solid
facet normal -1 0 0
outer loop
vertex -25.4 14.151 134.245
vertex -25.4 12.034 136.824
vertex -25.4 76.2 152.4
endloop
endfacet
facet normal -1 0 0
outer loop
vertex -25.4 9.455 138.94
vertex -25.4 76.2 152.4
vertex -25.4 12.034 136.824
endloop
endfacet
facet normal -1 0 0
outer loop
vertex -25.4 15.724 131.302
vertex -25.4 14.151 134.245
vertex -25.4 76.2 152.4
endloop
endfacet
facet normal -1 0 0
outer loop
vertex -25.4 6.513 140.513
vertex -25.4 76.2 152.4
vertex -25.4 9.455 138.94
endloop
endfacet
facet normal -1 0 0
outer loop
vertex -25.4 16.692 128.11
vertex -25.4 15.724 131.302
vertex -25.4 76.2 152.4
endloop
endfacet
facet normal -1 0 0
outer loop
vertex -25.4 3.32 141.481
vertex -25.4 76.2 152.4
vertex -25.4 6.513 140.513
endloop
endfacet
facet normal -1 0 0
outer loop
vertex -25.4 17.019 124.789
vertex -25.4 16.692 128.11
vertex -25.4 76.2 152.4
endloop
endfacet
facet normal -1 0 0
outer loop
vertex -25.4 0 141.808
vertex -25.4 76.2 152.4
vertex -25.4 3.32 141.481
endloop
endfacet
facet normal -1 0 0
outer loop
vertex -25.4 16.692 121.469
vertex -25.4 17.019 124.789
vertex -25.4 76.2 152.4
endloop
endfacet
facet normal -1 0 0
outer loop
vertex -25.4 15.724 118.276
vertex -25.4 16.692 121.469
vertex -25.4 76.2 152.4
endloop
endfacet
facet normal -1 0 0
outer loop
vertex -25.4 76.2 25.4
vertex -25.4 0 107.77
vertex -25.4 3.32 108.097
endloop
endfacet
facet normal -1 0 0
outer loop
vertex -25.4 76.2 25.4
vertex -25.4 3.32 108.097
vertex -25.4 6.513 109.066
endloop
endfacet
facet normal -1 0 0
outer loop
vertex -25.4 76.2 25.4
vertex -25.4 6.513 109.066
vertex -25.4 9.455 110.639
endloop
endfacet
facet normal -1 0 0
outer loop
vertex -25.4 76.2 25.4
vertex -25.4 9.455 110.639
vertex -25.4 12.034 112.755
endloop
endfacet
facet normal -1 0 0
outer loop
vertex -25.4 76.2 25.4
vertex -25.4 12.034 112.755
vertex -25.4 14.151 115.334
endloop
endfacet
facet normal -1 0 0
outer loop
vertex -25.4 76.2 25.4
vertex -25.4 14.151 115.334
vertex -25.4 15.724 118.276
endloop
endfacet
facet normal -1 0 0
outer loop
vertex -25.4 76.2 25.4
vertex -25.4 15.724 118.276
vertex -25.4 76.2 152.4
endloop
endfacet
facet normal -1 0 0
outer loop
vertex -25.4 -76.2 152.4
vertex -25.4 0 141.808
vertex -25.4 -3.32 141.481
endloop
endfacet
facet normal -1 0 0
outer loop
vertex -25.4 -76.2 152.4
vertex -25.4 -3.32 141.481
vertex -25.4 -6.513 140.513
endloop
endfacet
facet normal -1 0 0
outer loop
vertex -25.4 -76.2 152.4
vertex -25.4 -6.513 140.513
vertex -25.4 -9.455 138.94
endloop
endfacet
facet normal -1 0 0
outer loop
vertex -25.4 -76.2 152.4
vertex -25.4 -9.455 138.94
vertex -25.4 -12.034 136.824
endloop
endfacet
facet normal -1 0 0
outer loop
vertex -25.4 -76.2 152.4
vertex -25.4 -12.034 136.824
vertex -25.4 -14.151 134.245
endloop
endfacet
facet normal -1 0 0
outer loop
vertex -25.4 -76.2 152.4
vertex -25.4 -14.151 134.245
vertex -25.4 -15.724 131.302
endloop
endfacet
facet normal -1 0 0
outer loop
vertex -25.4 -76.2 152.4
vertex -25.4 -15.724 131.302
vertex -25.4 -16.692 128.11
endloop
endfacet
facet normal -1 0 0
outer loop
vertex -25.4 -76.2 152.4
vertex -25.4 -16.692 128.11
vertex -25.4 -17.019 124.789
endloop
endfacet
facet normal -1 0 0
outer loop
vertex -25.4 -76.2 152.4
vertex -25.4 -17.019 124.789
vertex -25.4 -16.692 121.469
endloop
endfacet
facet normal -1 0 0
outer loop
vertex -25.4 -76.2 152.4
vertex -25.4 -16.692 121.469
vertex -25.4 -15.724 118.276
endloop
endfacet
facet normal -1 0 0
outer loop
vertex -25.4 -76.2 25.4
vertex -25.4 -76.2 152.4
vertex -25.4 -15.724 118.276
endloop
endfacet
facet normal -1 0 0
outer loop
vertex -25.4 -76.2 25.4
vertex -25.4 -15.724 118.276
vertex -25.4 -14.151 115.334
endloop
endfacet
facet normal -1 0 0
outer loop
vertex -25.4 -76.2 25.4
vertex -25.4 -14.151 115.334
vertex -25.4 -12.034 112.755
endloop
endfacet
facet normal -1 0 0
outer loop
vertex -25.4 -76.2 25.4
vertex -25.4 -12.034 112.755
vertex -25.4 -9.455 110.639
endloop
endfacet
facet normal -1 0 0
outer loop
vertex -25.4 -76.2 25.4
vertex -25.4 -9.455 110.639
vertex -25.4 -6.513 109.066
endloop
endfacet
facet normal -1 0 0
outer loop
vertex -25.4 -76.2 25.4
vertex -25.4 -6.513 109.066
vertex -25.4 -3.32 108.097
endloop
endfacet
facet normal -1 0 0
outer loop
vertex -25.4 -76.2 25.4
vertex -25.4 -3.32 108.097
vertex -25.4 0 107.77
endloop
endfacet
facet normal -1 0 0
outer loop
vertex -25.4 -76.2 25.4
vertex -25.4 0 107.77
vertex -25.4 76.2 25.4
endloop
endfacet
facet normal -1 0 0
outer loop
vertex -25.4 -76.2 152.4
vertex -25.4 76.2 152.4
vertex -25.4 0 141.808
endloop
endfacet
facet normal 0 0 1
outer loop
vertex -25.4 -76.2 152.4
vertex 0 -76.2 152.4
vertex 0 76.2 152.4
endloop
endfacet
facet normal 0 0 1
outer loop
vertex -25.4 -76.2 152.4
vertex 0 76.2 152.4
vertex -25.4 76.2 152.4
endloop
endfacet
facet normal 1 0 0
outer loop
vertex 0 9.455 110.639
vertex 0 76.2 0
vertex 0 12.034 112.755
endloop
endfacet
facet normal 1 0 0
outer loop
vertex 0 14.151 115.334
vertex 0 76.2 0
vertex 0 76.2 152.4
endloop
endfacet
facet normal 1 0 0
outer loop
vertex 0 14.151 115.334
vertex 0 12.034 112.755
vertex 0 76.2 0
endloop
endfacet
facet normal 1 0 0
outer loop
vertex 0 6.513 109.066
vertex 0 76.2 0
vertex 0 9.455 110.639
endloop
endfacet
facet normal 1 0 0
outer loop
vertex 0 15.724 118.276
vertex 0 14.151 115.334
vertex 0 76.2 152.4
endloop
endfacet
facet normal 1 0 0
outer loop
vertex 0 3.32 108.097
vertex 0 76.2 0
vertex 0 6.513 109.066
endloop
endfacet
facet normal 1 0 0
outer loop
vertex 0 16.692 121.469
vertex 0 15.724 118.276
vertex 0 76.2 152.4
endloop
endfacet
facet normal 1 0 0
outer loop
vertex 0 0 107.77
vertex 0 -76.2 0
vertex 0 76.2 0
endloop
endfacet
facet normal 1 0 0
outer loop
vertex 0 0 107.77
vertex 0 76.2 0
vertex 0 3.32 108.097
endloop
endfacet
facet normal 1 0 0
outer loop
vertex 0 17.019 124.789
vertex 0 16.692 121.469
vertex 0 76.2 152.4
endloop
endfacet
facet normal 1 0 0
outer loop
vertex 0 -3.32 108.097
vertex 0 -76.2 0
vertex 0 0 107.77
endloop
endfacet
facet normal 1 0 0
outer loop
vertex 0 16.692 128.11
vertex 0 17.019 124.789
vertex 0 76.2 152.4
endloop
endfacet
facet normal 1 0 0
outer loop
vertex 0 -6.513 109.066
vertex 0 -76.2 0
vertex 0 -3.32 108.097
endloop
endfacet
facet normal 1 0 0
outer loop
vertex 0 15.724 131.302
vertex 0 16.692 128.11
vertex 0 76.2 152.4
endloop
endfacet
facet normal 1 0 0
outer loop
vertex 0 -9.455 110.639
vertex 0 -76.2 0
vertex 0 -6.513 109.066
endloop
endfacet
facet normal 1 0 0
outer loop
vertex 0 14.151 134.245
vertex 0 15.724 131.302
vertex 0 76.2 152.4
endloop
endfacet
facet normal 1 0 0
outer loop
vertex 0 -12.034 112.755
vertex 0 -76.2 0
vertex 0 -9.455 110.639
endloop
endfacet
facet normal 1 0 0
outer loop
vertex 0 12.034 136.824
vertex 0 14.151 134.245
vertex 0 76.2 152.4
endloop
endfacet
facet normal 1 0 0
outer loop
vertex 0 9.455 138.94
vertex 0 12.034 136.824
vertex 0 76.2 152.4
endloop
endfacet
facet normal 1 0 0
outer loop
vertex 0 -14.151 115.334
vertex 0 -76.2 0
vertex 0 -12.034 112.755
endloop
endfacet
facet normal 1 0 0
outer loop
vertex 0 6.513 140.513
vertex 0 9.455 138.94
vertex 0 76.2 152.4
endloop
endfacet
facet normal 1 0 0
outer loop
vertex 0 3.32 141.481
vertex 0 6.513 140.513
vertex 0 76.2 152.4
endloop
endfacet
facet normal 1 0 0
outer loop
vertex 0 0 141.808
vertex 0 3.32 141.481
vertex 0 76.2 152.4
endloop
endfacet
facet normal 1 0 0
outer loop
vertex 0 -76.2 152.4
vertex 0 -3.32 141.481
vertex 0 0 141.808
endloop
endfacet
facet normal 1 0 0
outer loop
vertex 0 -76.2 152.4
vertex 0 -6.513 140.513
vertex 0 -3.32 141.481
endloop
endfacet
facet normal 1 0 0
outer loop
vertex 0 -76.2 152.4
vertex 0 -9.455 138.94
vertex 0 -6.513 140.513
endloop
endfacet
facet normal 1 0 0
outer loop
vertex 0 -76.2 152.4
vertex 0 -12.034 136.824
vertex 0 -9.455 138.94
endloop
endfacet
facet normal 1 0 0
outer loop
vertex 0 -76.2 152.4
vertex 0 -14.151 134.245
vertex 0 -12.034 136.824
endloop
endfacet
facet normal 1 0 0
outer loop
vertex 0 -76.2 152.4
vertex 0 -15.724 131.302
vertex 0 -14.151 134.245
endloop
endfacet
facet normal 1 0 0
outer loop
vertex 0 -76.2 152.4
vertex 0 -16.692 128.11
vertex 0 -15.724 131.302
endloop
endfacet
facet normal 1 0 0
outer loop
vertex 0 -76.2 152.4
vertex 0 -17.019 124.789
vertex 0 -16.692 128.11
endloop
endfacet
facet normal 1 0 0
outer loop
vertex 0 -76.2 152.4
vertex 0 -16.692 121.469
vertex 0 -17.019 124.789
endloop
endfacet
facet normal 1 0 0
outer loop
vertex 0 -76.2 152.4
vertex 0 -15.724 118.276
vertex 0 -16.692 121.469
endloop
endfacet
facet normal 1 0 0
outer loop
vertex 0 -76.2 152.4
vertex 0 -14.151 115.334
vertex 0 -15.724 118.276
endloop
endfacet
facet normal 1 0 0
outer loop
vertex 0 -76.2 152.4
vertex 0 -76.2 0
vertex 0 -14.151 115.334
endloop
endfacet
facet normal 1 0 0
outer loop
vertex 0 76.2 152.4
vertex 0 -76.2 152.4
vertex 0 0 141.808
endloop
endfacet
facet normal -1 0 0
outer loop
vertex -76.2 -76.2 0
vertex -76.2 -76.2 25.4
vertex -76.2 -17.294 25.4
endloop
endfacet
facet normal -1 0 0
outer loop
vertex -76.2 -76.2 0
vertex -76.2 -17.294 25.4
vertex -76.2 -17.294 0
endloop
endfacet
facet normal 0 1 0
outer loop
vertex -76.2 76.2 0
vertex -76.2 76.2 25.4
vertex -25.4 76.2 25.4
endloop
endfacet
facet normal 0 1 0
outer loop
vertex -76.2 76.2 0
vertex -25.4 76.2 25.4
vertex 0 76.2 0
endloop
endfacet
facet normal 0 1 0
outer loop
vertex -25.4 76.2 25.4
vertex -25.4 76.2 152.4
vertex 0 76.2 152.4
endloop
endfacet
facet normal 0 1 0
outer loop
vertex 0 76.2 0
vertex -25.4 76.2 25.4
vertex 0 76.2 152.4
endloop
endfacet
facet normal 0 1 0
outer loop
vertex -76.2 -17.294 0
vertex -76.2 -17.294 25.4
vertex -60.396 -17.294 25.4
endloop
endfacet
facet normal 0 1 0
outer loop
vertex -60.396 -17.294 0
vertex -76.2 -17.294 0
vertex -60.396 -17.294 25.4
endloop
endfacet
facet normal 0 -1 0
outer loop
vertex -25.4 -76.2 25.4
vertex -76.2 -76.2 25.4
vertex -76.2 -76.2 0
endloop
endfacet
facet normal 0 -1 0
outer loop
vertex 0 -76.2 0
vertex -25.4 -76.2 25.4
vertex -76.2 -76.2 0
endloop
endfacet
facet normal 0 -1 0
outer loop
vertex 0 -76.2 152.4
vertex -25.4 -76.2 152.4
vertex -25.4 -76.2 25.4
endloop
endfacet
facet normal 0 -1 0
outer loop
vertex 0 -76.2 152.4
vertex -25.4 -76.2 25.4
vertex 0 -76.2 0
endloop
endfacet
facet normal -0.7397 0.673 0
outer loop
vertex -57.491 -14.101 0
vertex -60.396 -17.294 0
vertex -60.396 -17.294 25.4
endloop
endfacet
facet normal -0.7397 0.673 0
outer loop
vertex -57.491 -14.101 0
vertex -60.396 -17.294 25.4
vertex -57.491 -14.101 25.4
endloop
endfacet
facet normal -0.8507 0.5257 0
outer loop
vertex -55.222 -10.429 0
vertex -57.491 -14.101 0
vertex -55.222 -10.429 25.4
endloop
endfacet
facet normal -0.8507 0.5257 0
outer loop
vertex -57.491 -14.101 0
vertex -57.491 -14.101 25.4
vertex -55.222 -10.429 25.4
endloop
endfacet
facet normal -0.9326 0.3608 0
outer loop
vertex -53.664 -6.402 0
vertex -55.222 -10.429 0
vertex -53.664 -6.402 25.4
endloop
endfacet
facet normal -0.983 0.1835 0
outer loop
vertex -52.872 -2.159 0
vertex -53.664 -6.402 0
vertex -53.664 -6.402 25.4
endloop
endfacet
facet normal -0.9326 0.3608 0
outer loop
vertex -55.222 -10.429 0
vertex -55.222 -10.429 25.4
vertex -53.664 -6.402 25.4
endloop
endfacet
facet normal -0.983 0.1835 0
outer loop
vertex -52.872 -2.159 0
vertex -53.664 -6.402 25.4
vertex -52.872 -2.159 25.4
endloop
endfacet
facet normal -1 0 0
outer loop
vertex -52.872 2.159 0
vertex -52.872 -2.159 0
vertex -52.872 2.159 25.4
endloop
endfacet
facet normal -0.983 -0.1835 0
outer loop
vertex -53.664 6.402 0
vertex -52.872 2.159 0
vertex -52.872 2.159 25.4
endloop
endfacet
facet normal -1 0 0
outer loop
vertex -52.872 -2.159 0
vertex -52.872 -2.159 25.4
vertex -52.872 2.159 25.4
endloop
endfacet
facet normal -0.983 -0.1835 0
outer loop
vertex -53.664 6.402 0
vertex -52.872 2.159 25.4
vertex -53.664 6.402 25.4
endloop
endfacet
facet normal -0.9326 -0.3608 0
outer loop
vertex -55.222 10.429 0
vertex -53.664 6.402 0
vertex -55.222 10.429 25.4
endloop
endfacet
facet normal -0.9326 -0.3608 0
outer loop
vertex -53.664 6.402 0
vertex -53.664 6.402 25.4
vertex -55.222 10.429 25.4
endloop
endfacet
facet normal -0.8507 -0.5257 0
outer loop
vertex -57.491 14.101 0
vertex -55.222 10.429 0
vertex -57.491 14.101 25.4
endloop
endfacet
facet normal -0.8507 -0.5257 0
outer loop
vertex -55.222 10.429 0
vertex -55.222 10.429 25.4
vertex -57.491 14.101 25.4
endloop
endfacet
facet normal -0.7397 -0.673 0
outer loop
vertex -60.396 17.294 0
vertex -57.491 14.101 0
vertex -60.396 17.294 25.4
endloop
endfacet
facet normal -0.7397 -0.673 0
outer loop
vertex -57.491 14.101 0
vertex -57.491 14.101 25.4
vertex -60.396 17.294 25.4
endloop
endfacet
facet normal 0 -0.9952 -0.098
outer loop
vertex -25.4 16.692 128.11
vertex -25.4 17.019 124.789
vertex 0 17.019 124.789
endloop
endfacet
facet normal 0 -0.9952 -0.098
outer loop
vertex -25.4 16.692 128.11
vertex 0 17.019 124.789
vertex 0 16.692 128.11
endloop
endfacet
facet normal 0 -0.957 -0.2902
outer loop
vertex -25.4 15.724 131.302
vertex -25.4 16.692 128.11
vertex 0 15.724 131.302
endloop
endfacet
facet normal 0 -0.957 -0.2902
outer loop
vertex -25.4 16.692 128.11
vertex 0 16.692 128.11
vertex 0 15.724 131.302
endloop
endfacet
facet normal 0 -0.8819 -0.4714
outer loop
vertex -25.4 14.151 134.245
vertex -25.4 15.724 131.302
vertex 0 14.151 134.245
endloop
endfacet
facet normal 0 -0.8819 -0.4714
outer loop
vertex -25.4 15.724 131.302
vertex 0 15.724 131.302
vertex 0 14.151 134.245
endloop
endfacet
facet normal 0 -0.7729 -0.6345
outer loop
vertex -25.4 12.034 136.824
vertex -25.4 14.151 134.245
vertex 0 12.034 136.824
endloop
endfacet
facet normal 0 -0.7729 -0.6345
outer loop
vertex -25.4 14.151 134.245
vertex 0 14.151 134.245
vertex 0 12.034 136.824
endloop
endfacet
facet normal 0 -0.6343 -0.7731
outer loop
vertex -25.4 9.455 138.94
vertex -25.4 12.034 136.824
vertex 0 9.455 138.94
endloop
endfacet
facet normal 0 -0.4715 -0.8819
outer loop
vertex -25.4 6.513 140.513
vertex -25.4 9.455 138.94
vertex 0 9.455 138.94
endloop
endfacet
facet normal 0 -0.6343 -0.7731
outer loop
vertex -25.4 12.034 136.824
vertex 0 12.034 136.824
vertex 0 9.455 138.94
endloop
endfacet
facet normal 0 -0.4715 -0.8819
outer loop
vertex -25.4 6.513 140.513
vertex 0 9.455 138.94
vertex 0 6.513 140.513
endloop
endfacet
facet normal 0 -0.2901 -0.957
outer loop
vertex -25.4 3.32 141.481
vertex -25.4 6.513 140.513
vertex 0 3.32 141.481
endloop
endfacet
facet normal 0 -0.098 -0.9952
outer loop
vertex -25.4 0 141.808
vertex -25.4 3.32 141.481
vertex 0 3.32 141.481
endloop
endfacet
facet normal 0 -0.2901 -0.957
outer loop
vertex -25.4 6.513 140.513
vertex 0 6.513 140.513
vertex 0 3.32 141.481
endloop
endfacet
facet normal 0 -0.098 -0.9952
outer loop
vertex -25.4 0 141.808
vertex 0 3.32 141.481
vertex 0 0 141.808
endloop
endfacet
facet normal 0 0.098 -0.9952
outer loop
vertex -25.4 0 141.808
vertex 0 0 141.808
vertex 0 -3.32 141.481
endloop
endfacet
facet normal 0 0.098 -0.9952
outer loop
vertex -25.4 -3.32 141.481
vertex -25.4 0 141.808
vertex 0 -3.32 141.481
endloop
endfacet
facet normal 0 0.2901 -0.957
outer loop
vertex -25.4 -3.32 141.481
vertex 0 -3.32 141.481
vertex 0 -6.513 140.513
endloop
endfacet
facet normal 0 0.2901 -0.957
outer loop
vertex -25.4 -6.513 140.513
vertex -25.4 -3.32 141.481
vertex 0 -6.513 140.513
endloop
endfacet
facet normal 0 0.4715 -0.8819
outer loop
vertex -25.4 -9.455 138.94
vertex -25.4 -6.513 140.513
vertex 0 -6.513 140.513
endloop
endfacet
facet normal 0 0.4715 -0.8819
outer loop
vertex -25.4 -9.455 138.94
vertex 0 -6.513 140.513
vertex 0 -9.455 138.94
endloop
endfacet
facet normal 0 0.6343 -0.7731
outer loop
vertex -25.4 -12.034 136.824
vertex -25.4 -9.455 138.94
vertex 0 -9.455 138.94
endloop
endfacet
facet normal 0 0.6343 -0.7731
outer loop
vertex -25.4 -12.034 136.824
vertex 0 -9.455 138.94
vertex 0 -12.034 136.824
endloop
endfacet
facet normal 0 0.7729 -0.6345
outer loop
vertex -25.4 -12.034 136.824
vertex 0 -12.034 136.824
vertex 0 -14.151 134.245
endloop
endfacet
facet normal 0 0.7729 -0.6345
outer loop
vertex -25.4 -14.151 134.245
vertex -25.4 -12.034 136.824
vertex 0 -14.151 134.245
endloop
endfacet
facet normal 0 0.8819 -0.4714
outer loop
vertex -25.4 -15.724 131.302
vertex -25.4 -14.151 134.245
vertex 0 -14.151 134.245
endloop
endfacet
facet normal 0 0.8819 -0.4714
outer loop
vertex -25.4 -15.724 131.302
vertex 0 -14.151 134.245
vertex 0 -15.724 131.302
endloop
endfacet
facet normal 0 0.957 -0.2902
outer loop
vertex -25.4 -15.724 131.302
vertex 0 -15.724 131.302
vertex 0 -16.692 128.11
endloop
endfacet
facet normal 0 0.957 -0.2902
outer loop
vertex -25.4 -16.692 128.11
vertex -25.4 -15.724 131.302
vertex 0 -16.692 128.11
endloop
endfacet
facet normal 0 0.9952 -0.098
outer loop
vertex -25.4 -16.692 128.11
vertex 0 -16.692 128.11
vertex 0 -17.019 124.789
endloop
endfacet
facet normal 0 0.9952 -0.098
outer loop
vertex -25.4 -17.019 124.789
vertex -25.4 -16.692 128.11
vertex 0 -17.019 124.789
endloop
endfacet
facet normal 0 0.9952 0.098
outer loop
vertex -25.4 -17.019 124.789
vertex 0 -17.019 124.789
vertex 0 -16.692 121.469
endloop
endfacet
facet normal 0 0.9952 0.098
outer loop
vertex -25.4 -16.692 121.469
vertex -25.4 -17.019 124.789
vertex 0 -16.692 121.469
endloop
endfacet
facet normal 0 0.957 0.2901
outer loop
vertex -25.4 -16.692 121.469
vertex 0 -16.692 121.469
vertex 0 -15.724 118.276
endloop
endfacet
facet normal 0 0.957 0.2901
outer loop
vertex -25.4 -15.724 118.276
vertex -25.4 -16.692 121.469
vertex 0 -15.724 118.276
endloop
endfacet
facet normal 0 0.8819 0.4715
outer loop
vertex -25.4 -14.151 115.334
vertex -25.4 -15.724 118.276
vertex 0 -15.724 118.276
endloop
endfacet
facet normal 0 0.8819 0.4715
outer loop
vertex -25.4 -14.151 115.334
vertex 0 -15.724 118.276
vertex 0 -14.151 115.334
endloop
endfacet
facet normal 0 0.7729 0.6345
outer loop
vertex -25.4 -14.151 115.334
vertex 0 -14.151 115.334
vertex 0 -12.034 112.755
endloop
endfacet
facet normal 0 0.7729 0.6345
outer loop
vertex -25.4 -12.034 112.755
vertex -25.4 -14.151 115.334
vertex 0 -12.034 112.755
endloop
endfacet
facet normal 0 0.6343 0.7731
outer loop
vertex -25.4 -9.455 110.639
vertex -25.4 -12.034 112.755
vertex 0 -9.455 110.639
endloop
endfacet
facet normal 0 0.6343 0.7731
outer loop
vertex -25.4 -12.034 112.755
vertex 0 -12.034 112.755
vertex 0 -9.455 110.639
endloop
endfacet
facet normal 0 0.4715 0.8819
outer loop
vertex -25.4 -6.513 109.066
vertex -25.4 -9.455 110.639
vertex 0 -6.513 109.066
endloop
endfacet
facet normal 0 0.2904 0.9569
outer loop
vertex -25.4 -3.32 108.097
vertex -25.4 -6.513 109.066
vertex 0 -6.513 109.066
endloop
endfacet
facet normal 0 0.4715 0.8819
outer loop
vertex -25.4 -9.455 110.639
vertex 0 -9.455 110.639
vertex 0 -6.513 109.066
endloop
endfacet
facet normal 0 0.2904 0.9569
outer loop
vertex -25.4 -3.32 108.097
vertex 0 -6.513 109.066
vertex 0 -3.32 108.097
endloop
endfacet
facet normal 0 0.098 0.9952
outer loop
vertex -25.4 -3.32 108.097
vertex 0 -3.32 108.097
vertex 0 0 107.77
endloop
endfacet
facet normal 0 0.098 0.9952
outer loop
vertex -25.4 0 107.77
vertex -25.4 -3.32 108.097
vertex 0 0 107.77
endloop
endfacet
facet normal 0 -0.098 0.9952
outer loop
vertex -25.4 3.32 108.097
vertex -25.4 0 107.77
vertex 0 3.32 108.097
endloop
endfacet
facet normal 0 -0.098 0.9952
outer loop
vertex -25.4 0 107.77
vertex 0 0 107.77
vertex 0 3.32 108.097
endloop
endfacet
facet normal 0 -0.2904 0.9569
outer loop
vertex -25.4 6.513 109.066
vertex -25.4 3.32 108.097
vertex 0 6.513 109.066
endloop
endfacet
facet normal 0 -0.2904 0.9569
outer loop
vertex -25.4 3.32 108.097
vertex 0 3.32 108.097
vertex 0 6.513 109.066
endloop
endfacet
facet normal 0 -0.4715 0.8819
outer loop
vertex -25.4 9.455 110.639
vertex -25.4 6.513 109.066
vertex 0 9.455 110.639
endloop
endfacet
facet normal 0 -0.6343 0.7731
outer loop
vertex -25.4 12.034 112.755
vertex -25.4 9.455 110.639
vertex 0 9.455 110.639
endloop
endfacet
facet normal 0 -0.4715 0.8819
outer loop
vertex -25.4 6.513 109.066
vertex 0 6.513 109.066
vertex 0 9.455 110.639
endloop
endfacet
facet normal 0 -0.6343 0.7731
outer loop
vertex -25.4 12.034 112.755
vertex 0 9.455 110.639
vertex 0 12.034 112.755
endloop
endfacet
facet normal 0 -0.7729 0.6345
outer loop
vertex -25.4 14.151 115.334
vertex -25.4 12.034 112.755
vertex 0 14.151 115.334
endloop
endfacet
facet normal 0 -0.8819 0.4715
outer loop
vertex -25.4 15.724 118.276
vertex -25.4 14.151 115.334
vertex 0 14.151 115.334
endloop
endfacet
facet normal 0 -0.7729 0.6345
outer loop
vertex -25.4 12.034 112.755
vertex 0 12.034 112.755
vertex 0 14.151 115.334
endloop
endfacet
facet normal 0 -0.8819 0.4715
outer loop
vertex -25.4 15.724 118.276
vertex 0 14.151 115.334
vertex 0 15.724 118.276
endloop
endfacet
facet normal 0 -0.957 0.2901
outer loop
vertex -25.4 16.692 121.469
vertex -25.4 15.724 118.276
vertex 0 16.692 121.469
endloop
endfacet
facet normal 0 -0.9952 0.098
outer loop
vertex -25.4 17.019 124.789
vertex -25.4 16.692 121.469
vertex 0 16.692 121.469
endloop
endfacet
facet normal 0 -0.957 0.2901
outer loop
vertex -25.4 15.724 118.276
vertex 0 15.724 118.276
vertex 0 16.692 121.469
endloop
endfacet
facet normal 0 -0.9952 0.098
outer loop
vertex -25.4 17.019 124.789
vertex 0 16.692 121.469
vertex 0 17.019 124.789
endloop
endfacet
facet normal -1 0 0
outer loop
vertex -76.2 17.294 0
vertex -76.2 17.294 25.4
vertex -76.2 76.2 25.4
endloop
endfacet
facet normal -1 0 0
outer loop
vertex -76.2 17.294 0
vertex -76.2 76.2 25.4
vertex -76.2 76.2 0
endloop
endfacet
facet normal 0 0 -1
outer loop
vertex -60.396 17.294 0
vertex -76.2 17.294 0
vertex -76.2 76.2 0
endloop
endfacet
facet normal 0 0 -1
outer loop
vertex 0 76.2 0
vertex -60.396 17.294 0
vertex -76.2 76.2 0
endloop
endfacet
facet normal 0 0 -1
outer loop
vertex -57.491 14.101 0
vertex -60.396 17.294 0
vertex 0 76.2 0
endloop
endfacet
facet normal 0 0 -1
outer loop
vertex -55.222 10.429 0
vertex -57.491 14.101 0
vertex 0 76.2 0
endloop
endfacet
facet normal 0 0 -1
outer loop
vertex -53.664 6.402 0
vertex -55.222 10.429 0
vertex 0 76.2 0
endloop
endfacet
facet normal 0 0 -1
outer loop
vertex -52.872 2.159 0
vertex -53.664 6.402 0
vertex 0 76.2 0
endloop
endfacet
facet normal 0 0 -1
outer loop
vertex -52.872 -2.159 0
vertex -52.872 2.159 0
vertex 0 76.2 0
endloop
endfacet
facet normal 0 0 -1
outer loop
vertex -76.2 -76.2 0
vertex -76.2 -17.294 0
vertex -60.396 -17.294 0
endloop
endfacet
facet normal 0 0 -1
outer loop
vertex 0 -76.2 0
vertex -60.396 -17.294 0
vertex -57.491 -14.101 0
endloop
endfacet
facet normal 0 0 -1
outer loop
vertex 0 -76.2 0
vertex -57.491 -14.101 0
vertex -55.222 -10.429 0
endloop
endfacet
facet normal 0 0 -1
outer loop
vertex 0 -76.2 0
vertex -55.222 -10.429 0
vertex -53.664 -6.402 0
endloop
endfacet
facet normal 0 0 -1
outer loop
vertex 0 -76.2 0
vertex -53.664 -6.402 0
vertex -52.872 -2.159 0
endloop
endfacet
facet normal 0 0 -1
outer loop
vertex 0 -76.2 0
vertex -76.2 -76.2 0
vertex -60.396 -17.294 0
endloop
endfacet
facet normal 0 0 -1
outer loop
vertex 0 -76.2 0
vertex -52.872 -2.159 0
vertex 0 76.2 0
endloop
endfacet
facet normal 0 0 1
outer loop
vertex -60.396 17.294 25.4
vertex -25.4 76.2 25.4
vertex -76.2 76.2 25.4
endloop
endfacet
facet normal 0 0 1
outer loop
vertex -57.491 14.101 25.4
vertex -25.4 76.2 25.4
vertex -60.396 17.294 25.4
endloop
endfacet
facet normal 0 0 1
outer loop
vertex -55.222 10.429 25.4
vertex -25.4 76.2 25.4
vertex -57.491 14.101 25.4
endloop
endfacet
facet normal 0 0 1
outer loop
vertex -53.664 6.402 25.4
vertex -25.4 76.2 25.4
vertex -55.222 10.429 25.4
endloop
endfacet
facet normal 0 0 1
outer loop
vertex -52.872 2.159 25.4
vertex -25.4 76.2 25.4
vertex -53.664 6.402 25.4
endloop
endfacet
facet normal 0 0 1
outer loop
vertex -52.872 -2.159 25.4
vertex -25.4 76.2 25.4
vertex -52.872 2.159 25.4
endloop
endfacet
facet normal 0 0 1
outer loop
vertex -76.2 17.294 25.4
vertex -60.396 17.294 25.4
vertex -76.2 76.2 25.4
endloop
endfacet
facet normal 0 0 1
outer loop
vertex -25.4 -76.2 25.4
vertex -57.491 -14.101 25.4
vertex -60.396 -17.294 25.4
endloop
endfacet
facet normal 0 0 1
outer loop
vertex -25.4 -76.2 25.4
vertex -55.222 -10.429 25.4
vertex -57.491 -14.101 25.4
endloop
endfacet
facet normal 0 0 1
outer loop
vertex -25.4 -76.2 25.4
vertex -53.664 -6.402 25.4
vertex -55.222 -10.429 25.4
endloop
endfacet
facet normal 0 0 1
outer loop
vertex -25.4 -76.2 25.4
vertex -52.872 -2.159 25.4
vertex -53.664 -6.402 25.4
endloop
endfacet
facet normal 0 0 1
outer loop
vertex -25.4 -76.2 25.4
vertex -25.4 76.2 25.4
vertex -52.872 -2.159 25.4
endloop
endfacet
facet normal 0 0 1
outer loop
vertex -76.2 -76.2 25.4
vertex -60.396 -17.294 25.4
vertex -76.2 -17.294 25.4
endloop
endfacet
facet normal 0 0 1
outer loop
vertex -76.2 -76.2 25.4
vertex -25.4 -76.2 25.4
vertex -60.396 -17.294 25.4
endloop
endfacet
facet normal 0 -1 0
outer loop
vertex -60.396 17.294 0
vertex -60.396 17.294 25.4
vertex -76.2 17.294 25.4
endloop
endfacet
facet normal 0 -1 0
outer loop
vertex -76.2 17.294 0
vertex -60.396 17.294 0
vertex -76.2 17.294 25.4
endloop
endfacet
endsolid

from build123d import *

# Parameters (mm, degrees)
F1_DEPTH = 76.2
F2_R     = 17.019042
F3_DEPTH = 38.1
F5_DEPTH = 25.4


with BuildPart() as f1:
    # F0 (on Front) → F1 (new body, symmetric)
    with BuildSketch(Plane.XZ):
        Polygon((0, 0), (0, 152.4), (-25.4, 152.4), (-25.4, 25.4), (-76.2, 25.4), (-76.2, 0), align=None)
    extrude(amount=F1_DEPTH, both=True)

    # F2 (on face) → F3 (cut)
    with BuildSketch(Plane.YZ):
        with Locations((0, 124.789342)):
            Circle(F2_R)
    extrude(amount=-F3_DEPTH, mode=Mode.SUBTRACT)

    # F4 (on face) → F5 (cut, symmetric)
    with BuildSketch(Plane.XY.offset(25.4)):
        with BuildLine():
            Line((-76.2, -17.294263), (-60.396418, -17.294263))
            ThreePointArc((-60.396418, -17.294263), (-52.772565, 0), (-60.396418, 17.294263))
            Line((-60.396418, 17.294263), (-76.2, 17.294263))
            Line((-76.2, 17.294263), (-76.2, -17.294263))
        make_face()
    extrude(amount=F5_DEPTH, both=True, mode=Mode.SUBTRACT)


solid = f1.part
